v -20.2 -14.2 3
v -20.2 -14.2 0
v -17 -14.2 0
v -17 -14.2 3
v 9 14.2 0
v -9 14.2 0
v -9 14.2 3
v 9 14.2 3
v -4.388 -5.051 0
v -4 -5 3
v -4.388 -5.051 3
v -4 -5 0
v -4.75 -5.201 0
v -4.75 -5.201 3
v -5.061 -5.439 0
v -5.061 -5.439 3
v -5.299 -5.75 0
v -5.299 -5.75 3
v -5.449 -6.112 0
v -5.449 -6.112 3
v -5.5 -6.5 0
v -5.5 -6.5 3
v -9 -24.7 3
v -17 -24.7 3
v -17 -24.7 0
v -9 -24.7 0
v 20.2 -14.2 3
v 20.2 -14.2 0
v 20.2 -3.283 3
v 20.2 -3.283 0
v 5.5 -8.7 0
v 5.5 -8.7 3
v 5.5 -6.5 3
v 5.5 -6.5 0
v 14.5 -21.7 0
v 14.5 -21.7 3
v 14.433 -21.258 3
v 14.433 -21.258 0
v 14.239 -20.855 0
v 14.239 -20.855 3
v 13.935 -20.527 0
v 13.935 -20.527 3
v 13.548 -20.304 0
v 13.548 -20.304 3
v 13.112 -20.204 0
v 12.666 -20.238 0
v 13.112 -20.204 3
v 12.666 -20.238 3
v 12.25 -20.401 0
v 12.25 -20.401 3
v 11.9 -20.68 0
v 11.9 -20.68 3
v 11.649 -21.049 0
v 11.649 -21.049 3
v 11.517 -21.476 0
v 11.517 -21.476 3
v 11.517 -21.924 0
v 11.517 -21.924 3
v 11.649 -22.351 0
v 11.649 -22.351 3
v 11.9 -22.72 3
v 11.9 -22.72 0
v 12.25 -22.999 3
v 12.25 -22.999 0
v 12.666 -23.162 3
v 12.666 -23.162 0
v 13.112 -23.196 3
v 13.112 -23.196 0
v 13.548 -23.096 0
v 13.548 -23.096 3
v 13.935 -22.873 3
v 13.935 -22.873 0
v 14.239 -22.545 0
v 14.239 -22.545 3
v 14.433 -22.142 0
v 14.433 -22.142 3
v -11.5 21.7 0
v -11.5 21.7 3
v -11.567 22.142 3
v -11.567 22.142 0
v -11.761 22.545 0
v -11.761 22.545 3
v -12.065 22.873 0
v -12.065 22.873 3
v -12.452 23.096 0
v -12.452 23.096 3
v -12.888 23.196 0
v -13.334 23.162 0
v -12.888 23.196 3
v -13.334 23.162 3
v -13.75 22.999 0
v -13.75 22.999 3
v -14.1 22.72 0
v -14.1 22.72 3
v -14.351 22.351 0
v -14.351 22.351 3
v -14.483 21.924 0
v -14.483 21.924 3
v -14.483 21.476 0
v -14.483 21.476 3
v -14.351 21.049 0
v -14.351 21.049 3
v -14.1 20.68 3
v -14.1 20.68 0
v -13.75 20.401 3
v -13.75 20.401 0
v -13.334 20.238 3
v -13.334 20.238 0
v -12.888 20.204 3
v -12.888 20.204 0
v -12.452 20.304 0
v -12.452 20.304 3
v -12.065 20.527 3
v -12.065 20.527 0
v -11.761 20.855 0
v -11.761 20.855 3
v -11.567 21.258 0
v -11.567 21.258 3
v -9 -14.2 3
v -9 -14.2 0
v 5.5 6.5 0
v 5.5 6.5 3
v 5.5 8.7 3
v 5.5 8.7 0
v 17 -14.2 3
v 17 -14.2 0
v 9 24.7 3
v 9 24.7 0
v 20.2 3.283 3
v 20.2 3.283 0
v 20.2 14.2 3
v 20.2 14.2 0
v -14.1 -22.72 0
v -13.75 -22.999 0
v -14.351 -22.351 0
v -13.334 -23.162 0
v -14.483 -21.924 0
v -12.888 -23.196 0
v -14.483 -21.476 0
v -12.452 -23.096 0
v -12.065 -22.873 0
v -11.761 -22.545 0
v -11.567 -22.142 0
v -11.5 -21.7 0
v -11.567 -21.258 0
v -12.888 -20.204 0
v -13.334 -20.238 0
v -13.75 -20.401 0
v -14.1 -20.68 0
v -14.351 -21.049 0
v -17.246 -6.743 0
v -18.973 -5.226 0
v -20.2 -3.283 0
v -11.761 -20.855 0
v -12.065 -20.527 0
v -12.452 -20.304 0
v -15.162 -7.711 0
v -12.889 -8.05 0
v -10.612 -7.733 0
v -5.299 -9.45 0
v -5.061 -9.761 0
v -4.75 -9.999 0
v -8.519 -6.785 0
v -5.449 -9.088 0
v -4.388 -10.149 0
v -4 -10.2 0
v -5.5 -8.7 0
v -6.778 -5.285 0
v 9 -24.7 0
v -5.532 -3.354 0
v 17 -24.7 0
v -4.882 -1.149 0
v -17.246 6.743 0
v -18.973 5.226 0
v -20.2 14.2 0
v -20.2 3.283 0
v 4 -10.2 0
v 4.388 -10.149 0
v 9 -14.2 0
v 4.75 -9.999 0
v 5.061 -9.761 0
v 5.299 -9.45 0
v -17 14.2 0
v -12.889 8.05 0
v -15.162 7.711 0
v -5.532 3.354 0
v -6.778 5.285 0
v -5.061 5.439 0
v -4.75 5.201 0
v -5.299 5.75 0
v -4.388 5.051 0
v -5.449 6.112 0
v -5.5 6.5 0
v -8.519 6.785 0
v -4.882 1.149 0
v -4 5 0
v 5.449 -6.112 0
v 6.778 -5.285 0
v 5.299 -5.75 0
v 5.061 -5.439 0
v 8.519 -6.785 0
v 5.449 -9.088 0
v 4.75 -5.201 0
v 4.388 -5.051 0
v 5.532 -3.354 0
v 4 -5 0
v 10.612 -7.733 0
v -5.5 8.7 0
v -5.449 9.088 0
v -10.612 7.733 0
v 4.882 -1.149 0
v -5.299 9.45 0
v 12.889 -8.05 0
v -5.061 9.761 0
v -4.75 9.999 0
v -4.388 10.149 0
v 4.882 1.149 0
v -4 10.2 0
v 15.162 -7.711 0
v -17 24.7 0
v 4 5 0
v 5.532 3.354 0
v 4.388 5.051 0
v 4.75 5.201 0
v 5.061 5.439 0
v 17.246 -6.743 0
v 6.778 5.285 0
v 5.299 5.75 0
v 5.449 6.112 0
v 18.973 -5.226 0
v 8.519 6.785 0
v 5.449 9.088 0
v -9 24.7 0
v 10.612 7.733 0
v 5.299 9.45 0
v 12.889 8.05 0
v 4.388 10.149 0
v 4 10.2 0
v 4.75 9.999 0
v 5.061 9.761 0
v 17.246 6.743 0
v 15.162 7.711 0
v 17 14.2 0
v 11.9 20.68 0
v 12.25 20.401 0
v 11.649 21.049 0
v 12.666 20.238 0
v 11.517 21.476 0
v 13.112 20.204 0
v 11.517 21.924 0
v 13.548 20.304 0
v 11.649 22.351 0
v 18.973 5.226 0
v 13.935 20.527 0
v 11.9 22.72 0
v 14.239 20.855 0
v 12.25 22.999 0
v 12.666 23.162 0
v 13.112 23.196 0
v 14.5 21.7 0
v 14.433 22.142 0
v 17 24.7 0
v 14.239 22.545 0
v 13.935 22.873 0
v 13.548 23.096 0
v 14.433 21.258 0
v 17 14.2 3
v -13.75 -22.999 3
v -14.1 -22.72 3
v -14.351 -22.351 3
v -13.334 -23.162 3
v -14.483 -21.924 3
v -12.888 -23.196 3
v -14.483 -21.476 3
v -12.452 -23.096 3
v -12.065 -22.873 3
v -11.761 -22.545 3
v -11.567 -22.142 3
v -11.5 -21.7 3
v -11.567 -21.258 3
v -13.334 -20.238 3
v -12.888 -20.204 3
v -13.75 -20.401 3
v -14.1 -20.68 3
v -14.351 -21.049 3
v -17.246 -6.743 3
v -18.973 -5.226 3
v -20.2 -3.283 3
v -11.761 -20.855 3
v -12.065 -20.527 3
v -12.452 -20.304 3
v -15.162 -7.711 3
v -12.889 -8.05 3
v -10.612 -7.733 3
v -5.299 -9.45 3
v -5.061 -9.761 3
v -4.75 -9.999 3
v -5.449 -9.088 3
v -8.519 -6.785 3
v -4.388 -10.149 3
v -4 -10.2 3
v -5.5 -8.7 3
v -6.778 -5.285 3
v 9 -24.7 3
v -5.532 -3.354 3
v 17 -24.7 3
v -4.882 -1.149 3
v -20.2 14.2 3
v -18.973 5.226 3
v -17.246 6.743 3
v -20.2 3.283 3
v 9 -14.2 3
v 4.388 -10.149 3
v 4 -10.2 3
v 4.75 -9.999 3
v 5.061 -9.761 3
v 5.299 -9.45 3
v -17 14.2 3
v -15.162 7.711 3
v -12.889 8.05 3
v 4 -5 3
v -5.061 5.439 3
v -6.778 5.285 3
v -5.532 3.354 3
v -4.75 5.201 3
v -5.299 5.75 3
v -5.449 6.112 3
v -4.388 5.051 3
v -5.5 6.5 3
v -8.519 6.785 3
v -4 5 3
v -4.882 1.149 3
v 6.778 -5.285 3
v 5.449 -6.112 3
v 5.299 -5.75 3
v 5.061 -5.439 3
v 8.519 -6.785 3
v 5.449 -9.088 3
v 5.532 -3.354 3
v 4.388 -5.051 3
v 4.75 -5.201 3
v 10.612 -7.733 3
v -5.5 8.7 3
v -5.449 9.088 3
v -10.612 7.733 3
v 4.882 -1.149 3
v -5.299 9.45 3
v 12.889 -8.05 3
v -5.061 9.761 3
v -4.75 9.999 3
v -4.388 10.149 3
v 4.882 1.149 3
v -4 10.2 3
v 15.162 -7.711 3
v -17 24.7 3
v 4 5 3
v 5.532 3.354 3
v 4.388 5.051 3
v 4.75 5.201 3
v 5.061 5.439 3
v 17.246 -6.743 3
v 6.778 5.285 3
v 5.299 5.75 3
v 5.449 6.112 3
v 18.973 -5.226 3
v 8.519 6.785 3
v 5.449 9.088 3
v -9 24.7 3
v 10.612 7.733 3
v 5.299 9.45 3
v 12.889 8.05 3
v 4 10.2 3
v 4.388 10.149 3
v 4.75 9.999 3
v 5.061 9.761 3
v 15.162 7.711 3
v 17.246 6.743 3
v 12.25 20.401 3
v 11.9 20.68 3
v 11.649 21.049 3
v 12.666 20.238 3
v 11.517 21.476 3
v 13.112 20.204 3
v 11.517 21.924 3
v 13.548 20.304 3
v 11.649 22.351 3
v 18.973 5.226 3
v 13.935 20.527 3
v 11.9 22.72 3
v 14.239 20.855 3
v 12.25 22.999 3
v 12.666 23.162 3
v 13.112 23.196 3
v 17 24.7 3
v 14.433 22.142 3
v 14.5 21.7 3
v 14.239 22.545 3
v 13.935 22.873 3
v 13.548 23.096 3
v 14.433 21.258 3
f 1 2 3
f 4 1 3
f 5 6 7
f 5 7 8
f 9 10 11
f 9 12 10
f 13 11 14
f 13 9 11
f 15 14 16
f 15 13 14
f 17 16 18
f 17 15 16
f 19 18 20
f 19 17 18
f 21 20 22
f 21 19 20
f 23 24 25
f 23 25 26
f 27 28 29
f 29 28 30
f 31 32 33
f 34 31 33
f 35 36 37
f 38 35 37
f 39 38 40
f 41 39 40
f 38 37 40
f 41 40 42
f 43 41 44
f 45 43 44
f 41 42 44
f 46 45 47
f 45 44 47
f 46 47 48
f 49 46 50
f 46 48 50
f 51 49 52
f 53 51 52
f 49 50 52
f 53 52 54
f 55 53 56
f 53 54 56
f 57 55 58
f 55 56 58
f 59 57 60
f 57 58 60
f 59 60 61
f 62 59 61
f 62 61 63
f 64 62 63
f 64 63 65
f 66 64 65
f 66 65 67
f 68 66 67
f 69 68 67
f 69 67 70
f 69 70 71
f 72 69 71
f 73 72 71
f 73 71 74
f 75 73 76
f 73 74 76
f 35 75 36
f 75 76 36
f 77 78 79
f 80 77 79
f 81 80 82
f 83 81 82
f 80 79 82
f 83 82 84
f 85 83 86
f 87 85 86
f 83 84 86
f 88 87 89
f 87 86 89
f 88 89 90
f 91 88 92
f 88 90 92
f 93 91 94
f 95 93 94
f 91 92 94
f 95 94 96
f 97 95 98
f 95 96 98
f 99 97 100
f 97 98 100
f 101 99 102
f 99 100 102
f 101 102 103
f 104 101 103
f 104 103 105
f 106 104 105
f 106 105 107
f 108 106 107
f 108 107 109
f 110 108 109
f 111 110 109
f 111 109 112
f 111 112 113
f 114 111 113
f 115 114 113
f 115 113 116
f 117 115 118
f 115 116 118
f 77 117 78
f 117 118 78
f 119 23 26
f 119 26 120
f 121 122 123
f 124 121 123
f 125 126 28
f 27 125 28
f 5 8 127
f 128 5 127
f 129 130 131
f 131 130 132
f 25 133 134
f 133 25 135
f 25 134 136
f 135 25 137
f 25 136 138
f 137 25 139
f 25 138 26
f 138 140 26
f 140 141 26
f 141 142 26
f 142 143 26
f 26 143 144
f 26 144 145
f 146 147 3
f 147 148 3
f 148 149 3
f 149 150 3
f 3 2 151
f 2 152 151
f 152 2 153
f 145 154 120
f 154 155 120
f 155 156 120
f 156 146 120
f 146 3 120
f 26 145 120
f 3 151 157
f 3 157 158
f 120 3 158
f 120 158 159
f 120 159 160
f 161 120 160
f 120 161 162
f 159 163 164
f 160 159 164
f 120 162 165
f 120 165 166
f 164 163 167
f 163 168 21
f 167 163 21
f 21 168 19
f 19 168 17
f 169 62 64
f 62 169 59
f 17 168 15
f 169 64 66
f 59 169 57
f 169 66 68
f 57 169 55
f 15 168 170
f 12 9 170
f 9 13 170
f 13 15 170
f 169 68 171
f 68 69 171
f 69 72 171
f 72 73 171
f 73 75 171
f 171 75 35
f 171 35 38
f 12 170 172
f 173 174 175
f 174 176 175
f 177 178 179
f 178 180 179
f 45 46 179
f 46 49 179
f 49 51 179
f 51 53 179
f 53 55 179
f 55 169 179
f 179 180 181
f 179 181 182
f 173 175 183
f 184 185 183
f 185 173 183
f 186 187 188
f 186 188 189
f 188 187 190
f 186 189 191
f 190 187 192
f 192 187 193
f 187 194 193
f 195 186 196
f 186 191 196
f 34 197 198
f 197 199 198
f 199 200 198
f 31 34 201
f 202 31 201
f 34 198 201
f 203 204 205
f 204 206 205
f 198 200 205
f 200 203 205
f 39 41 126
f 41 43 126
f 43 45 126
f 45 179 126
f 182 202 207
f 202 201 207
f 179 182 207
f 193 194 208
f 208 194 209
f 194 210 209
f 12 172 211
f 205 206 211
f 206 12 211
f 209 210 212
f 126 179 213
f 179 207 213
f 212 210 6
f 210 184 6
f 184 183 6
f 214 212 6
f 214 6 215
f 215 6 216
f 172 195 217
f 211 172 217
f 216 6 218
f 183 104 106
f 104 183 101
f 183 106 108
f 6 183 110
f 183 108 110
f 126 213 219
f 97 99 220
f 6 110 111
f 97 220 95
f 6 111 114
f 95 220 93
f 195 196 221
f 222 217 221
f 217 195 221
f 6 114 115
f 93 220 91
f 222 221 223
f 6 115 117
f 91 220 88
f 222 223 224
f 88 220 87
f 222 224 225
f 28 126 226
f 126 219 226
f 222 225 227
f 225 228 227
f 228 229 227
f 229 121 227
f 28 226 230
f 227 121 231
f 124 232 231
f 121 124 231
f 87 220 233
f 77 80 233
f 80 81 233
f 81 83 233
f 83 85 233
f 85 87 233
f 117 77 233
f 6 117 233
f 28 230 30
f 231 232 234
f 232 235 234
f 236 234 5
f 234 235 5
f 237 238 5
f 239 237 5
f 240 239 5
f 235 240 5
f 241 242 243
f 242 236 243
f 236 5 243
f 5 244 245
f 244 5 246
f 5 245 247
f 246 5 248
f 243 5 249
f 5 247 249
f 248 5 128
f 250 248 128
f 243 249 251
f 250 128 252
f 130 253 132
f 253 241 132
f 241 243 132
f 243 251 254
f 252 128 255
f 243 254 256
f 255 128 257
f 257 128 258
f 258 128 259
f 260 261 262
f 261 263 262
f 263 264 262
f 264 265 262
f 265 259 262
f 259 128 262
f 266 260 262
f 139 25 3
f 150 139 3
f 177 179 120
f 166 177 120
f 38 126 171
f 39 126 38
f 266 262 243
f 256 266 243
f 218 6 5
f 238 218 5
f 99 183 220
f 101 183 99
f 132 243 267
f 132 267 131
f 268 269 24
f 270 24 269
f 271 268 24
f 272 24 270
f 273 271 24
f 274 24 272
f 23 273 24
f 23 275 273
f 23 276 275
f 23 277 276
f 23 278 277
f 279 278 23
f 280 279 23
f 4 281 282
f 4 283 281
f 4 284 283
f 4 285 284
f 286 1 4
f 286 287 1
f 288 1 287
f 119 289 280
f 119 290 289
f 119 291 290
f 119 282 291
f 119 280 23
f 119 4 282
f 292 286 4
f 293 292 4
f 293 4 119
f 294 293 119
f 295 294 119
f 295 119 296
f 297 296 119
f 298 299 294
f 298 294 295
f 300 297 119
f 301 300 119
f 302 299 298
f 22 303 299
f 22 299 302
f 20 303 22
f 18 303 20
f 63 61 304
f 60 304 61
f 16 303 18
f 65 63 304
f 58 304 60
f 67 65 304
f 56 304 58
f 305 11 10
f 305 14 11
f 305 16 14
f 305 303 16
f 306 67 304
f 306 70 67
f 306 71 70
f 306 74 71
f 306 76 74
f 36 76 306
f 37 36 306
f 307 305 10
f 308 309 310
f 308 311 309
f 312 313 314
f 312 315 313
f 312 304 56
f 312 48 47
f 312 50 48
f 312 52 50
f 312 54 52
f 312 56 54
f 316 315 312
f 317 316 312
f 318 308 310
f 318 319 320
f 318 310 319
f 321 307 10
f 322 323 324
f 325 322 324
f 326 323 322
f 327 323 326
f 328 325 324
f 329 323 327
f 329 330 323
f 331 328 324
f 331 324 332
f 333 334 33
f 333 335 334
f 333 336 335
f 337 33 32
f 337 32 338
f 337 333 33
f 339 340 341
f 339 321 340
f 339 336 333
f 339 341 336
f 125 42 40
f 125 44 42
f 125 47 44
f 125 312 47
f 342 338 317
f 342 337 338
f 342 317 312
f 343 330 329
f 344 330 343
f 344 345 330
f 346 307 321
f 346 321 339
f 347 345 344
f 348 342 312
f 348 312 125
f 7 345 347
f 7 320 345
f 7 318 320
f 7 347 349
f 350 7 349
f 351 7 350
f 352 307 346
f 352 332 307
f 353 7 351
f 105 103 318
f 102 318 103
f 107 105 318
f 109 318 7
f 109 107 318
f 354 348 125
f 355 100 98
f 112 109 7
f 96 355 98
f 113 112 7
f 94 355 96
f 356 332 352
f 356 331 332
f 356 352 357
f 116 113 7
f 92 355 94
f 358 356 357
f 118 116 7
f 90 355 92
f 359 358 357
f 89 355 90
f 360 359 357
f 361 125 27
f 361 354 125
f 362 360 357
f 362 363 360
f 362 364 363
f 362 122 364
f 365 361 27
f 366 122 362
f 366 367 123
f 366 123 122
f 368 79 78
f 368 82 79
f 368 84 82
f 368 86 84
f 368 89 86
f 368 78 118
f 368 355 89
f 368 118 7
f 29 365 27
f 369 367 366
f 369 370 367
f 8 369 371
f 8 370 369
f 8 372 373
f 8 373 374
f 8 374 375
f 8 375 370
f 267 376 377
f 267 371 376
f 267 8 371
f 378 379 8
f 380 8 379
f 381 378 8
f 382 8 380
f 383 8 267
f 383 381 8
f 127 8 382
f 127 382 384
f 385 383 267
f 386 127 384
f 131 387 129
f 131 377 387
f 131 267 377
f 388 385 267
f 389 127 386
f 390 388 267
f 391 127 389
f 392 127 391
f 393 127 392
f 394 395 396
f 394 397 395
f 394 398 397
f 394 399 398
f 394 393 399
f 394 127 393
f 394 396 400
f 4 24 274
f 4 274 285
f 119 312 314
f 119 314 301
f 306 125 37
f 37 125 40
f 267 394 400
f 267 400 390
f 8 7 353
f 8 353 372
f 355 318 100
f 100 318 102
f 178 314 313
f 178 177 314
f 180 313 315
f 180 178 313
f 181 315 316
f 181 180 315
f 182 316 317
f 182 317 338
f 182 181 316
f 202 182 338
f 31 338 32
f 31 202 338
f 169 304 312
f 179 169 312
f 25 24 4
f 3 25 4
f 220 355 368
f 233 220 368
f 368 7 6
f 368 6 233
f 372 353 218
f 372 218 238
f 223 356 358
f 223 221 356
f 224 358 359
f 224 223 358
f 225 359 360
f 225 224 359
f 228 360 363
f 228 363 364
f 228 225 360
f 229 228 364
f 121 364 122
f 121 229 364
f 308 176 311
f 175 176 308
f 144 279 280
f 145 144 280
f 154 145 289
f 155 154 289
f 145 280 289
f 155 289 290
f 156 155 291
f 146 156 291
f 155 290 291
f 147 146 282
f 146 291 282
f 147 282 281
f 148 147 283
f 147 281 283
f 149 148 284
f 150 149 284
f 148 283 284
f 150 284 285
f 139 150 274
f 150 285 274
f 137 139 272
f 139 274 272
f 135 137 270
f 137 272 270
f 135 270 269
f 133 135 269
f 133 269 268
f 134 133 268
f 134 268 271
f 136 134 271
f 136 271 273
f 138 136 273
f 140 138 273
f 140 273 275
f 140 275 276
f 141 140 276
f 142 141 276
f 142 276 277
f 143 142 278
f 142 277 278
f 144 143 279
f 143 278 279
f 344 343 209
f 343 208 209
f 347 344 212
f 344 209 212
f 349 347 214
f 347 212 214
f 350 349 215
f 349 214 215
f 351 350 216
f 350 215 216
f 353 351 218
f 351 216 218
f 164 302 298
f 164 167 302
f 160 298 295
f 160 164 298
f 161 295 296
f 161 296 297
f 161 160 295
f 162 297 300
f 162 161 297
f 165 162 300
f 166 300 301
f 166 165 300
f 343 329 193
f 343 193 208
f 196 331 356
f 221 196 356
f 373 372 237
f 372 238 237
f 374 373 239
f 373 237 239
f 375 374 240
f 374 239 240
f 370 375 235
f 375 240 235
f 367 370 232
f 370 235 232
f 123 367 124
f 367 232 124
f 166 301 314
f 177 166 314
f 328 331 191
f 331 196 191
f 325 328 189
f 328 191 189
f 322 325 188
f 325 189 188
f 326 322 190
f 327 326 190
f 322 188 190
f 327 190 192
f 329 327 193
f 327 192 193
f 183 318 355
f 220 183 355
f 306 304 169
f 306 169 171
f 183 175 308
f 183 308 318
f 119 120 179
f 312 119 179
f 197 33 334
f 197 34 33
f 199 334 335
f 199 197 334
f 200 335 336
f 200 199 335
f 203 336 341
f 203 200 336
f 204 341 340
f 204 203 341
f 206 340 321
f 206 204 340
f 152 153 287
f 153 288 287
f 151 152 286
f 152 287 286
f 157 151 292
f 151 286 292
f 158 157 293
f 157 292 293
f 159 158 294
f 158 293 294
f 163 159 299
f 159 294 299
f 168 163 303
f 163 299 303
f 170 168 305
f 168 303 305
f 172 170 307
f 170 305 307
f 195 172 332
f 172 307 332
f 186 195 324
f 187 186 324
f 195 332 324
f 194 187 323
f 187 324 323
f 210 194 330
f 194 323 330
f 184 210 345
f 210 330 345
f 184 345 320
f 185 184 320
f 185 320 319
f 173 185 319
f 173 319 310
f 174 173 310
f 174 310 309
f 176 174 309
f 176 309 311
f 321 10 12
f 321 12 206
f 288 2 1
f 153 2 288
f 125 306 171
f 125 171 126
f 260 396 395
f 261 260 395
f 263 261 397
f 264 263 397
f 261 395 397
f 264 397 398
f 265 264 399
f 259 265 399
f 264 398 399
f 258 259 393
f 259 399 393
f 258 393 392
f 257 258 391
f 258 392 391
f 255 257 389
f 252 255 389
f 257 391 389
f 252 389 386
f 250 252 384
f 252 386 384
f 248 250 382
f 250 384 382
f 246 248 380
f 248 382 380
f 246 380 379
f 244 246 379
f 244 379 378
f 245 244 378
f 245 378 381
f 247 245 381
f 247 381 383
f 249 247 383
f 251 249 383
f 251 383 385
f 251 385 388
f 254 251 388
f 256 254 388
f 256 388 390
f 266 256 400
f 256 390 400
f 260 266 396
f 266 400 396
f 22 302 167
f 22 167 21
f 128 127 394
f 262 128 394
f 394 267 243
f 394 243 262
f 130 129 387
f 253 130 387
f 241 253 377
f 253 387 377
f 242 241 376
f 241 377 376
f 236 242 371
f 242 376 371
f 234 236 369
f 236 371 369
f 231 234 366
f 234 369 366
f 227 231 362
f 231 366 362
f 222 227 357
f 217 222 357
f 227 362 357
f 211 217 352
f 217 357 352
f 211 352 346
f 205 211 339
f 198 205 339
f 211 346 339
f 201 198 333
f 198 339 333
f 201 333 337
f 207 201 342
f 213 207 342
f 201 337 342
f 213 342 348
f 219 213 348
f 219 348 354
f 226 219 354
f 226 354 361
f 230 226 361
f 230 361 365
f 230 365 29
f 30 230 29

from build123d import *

# Parameters (mm, degrees)
ESBO_O1_W                = 40.4
ESBO_O1_H                = 28.4
RESSALTO_EXTRUS_O1_DEPTH = 3
ESBO_O2_W                = 8
ESBO_O2_H                = 10.5
ESBO_O2_R                = 1.5
RESSALTO_EXTRUS_O2_DEPTH = 3
ESBO_O3_R                = 8.05
ESBO_O3_W                = 11
ESBO_O3_H                = 5.2
CORTE_EXTRUS_O1_DEPTH    = 33.048868935
FILETE1_R                = 1.5
FILETE2_R                = 1.5
FILETE3_R                = 1.5


with BuildPart() as part:
    # Esboço1 → Ressalto-extrusão1 (new body)
    with BuildSketch(Plane.XY):
        Rectangle(ESBO_O1_W, ESBO_O1_H)
    extrude(amount=RESSALTO_EXTRUS_O1_DEPTH)

    # Esboço2 → Ressalto-extrusão2 (add)
    # profile 1 of 4: a face of its own
    with BuildSketch(Plane.XY.offset(3)):
        with Locations((-13, -19.45)):
            Rectangle(ESBO_O2_W, ESBO_O2_H)
        with Locations((-13, -21.7)):
            Circle(ESBO_O2_R, mode=Mode.SUBTRACT)
    # profile 2 of 4: a face of its own
    with BuildSketch(Plane.XY.offset(3)):
        with Locations((13, -19.45)):
            Rectangle(ESBO_O2_W, ESBO_O2_H)
        with Locations((13, -21.7)):
            Circle(ESBO_O2_R, mode=Mode.SUBTRACT)
    # profile 3 of 4: a face of its own
    with BuildSketch(Plane.XY.offset(3)):
        with Locations((13, 19.45)):
            Rectangle(ESBO_O2_W, ESBO_O2_H)
        with Locations((13, 21.7)):
            Circle(ESBO_O2_R, mode=Mode.SUBTRACT)
    # profile 4 of 4: a face of its own
    with BuildSketch(Plane.XY.offset(3)):
        with Locations((-13, 19.45)):
            Rectangle(ESBO_O2_W, ESBO_O2_H)
        with Locations((-13, 21.7)):
            Circle(ESBO_O2_R, mode=Mode.SUBTRACT)
    extrude(amount=-RESSALTO_EXTRUS_O2_DEPTH)

    # Esboço3 → Corte-extrusão1 (cut, through all)
    with BuildSketch(Plane.XY.offset(3)):
        with Locations((-12.85, 0)):
            Circle(ESBO_O3_R)
        with Locations((12.85, 0)):
            Circle(ESBO_O3_R)
        with Locations((0, -7.6)):
            Rectangle(ESBO_O3_W, ESBO_O3_H)
        with Locations((0, 7.6)):
            Rectangle(ESBO_O3_W, ESBO_O3_H)
    extrude(amount=-CORTE_EXTRUS_O1_DEPTH, mode=Mode.SUBTRACT)

    # Filete1
    filete1_edges = [part.edges().sort_by_distance(p)[0] for p in [
        (-5.5, -5, 1.5),
        (5.5, -5, 1.5),
    ]]
    fillet(filete1_edges, radius=FILETE1_R)

    # Filete2
    filete2_edges = [part.edges().sort_by_distance(p)[0] for p in [
        (-5.5, -10.2, 1.5),
        (5.5, -10.2, 1.5),
    ]]
    fillet(filete2_edges, radius=FILETE2_R)

    # Filete3
    filete3_edges = [part.edges().sort_by_distance(p)[0] for p in [
        (5.5, 10.2, 1.5),
        (5.5, 5, 1.5),
        (-5.5, 5, 1.5),
        (-5.5, 10.2, 1.5),
    ]]
    fillet(filete3_edges, radius=FILETE3_R)


solid = part.part
